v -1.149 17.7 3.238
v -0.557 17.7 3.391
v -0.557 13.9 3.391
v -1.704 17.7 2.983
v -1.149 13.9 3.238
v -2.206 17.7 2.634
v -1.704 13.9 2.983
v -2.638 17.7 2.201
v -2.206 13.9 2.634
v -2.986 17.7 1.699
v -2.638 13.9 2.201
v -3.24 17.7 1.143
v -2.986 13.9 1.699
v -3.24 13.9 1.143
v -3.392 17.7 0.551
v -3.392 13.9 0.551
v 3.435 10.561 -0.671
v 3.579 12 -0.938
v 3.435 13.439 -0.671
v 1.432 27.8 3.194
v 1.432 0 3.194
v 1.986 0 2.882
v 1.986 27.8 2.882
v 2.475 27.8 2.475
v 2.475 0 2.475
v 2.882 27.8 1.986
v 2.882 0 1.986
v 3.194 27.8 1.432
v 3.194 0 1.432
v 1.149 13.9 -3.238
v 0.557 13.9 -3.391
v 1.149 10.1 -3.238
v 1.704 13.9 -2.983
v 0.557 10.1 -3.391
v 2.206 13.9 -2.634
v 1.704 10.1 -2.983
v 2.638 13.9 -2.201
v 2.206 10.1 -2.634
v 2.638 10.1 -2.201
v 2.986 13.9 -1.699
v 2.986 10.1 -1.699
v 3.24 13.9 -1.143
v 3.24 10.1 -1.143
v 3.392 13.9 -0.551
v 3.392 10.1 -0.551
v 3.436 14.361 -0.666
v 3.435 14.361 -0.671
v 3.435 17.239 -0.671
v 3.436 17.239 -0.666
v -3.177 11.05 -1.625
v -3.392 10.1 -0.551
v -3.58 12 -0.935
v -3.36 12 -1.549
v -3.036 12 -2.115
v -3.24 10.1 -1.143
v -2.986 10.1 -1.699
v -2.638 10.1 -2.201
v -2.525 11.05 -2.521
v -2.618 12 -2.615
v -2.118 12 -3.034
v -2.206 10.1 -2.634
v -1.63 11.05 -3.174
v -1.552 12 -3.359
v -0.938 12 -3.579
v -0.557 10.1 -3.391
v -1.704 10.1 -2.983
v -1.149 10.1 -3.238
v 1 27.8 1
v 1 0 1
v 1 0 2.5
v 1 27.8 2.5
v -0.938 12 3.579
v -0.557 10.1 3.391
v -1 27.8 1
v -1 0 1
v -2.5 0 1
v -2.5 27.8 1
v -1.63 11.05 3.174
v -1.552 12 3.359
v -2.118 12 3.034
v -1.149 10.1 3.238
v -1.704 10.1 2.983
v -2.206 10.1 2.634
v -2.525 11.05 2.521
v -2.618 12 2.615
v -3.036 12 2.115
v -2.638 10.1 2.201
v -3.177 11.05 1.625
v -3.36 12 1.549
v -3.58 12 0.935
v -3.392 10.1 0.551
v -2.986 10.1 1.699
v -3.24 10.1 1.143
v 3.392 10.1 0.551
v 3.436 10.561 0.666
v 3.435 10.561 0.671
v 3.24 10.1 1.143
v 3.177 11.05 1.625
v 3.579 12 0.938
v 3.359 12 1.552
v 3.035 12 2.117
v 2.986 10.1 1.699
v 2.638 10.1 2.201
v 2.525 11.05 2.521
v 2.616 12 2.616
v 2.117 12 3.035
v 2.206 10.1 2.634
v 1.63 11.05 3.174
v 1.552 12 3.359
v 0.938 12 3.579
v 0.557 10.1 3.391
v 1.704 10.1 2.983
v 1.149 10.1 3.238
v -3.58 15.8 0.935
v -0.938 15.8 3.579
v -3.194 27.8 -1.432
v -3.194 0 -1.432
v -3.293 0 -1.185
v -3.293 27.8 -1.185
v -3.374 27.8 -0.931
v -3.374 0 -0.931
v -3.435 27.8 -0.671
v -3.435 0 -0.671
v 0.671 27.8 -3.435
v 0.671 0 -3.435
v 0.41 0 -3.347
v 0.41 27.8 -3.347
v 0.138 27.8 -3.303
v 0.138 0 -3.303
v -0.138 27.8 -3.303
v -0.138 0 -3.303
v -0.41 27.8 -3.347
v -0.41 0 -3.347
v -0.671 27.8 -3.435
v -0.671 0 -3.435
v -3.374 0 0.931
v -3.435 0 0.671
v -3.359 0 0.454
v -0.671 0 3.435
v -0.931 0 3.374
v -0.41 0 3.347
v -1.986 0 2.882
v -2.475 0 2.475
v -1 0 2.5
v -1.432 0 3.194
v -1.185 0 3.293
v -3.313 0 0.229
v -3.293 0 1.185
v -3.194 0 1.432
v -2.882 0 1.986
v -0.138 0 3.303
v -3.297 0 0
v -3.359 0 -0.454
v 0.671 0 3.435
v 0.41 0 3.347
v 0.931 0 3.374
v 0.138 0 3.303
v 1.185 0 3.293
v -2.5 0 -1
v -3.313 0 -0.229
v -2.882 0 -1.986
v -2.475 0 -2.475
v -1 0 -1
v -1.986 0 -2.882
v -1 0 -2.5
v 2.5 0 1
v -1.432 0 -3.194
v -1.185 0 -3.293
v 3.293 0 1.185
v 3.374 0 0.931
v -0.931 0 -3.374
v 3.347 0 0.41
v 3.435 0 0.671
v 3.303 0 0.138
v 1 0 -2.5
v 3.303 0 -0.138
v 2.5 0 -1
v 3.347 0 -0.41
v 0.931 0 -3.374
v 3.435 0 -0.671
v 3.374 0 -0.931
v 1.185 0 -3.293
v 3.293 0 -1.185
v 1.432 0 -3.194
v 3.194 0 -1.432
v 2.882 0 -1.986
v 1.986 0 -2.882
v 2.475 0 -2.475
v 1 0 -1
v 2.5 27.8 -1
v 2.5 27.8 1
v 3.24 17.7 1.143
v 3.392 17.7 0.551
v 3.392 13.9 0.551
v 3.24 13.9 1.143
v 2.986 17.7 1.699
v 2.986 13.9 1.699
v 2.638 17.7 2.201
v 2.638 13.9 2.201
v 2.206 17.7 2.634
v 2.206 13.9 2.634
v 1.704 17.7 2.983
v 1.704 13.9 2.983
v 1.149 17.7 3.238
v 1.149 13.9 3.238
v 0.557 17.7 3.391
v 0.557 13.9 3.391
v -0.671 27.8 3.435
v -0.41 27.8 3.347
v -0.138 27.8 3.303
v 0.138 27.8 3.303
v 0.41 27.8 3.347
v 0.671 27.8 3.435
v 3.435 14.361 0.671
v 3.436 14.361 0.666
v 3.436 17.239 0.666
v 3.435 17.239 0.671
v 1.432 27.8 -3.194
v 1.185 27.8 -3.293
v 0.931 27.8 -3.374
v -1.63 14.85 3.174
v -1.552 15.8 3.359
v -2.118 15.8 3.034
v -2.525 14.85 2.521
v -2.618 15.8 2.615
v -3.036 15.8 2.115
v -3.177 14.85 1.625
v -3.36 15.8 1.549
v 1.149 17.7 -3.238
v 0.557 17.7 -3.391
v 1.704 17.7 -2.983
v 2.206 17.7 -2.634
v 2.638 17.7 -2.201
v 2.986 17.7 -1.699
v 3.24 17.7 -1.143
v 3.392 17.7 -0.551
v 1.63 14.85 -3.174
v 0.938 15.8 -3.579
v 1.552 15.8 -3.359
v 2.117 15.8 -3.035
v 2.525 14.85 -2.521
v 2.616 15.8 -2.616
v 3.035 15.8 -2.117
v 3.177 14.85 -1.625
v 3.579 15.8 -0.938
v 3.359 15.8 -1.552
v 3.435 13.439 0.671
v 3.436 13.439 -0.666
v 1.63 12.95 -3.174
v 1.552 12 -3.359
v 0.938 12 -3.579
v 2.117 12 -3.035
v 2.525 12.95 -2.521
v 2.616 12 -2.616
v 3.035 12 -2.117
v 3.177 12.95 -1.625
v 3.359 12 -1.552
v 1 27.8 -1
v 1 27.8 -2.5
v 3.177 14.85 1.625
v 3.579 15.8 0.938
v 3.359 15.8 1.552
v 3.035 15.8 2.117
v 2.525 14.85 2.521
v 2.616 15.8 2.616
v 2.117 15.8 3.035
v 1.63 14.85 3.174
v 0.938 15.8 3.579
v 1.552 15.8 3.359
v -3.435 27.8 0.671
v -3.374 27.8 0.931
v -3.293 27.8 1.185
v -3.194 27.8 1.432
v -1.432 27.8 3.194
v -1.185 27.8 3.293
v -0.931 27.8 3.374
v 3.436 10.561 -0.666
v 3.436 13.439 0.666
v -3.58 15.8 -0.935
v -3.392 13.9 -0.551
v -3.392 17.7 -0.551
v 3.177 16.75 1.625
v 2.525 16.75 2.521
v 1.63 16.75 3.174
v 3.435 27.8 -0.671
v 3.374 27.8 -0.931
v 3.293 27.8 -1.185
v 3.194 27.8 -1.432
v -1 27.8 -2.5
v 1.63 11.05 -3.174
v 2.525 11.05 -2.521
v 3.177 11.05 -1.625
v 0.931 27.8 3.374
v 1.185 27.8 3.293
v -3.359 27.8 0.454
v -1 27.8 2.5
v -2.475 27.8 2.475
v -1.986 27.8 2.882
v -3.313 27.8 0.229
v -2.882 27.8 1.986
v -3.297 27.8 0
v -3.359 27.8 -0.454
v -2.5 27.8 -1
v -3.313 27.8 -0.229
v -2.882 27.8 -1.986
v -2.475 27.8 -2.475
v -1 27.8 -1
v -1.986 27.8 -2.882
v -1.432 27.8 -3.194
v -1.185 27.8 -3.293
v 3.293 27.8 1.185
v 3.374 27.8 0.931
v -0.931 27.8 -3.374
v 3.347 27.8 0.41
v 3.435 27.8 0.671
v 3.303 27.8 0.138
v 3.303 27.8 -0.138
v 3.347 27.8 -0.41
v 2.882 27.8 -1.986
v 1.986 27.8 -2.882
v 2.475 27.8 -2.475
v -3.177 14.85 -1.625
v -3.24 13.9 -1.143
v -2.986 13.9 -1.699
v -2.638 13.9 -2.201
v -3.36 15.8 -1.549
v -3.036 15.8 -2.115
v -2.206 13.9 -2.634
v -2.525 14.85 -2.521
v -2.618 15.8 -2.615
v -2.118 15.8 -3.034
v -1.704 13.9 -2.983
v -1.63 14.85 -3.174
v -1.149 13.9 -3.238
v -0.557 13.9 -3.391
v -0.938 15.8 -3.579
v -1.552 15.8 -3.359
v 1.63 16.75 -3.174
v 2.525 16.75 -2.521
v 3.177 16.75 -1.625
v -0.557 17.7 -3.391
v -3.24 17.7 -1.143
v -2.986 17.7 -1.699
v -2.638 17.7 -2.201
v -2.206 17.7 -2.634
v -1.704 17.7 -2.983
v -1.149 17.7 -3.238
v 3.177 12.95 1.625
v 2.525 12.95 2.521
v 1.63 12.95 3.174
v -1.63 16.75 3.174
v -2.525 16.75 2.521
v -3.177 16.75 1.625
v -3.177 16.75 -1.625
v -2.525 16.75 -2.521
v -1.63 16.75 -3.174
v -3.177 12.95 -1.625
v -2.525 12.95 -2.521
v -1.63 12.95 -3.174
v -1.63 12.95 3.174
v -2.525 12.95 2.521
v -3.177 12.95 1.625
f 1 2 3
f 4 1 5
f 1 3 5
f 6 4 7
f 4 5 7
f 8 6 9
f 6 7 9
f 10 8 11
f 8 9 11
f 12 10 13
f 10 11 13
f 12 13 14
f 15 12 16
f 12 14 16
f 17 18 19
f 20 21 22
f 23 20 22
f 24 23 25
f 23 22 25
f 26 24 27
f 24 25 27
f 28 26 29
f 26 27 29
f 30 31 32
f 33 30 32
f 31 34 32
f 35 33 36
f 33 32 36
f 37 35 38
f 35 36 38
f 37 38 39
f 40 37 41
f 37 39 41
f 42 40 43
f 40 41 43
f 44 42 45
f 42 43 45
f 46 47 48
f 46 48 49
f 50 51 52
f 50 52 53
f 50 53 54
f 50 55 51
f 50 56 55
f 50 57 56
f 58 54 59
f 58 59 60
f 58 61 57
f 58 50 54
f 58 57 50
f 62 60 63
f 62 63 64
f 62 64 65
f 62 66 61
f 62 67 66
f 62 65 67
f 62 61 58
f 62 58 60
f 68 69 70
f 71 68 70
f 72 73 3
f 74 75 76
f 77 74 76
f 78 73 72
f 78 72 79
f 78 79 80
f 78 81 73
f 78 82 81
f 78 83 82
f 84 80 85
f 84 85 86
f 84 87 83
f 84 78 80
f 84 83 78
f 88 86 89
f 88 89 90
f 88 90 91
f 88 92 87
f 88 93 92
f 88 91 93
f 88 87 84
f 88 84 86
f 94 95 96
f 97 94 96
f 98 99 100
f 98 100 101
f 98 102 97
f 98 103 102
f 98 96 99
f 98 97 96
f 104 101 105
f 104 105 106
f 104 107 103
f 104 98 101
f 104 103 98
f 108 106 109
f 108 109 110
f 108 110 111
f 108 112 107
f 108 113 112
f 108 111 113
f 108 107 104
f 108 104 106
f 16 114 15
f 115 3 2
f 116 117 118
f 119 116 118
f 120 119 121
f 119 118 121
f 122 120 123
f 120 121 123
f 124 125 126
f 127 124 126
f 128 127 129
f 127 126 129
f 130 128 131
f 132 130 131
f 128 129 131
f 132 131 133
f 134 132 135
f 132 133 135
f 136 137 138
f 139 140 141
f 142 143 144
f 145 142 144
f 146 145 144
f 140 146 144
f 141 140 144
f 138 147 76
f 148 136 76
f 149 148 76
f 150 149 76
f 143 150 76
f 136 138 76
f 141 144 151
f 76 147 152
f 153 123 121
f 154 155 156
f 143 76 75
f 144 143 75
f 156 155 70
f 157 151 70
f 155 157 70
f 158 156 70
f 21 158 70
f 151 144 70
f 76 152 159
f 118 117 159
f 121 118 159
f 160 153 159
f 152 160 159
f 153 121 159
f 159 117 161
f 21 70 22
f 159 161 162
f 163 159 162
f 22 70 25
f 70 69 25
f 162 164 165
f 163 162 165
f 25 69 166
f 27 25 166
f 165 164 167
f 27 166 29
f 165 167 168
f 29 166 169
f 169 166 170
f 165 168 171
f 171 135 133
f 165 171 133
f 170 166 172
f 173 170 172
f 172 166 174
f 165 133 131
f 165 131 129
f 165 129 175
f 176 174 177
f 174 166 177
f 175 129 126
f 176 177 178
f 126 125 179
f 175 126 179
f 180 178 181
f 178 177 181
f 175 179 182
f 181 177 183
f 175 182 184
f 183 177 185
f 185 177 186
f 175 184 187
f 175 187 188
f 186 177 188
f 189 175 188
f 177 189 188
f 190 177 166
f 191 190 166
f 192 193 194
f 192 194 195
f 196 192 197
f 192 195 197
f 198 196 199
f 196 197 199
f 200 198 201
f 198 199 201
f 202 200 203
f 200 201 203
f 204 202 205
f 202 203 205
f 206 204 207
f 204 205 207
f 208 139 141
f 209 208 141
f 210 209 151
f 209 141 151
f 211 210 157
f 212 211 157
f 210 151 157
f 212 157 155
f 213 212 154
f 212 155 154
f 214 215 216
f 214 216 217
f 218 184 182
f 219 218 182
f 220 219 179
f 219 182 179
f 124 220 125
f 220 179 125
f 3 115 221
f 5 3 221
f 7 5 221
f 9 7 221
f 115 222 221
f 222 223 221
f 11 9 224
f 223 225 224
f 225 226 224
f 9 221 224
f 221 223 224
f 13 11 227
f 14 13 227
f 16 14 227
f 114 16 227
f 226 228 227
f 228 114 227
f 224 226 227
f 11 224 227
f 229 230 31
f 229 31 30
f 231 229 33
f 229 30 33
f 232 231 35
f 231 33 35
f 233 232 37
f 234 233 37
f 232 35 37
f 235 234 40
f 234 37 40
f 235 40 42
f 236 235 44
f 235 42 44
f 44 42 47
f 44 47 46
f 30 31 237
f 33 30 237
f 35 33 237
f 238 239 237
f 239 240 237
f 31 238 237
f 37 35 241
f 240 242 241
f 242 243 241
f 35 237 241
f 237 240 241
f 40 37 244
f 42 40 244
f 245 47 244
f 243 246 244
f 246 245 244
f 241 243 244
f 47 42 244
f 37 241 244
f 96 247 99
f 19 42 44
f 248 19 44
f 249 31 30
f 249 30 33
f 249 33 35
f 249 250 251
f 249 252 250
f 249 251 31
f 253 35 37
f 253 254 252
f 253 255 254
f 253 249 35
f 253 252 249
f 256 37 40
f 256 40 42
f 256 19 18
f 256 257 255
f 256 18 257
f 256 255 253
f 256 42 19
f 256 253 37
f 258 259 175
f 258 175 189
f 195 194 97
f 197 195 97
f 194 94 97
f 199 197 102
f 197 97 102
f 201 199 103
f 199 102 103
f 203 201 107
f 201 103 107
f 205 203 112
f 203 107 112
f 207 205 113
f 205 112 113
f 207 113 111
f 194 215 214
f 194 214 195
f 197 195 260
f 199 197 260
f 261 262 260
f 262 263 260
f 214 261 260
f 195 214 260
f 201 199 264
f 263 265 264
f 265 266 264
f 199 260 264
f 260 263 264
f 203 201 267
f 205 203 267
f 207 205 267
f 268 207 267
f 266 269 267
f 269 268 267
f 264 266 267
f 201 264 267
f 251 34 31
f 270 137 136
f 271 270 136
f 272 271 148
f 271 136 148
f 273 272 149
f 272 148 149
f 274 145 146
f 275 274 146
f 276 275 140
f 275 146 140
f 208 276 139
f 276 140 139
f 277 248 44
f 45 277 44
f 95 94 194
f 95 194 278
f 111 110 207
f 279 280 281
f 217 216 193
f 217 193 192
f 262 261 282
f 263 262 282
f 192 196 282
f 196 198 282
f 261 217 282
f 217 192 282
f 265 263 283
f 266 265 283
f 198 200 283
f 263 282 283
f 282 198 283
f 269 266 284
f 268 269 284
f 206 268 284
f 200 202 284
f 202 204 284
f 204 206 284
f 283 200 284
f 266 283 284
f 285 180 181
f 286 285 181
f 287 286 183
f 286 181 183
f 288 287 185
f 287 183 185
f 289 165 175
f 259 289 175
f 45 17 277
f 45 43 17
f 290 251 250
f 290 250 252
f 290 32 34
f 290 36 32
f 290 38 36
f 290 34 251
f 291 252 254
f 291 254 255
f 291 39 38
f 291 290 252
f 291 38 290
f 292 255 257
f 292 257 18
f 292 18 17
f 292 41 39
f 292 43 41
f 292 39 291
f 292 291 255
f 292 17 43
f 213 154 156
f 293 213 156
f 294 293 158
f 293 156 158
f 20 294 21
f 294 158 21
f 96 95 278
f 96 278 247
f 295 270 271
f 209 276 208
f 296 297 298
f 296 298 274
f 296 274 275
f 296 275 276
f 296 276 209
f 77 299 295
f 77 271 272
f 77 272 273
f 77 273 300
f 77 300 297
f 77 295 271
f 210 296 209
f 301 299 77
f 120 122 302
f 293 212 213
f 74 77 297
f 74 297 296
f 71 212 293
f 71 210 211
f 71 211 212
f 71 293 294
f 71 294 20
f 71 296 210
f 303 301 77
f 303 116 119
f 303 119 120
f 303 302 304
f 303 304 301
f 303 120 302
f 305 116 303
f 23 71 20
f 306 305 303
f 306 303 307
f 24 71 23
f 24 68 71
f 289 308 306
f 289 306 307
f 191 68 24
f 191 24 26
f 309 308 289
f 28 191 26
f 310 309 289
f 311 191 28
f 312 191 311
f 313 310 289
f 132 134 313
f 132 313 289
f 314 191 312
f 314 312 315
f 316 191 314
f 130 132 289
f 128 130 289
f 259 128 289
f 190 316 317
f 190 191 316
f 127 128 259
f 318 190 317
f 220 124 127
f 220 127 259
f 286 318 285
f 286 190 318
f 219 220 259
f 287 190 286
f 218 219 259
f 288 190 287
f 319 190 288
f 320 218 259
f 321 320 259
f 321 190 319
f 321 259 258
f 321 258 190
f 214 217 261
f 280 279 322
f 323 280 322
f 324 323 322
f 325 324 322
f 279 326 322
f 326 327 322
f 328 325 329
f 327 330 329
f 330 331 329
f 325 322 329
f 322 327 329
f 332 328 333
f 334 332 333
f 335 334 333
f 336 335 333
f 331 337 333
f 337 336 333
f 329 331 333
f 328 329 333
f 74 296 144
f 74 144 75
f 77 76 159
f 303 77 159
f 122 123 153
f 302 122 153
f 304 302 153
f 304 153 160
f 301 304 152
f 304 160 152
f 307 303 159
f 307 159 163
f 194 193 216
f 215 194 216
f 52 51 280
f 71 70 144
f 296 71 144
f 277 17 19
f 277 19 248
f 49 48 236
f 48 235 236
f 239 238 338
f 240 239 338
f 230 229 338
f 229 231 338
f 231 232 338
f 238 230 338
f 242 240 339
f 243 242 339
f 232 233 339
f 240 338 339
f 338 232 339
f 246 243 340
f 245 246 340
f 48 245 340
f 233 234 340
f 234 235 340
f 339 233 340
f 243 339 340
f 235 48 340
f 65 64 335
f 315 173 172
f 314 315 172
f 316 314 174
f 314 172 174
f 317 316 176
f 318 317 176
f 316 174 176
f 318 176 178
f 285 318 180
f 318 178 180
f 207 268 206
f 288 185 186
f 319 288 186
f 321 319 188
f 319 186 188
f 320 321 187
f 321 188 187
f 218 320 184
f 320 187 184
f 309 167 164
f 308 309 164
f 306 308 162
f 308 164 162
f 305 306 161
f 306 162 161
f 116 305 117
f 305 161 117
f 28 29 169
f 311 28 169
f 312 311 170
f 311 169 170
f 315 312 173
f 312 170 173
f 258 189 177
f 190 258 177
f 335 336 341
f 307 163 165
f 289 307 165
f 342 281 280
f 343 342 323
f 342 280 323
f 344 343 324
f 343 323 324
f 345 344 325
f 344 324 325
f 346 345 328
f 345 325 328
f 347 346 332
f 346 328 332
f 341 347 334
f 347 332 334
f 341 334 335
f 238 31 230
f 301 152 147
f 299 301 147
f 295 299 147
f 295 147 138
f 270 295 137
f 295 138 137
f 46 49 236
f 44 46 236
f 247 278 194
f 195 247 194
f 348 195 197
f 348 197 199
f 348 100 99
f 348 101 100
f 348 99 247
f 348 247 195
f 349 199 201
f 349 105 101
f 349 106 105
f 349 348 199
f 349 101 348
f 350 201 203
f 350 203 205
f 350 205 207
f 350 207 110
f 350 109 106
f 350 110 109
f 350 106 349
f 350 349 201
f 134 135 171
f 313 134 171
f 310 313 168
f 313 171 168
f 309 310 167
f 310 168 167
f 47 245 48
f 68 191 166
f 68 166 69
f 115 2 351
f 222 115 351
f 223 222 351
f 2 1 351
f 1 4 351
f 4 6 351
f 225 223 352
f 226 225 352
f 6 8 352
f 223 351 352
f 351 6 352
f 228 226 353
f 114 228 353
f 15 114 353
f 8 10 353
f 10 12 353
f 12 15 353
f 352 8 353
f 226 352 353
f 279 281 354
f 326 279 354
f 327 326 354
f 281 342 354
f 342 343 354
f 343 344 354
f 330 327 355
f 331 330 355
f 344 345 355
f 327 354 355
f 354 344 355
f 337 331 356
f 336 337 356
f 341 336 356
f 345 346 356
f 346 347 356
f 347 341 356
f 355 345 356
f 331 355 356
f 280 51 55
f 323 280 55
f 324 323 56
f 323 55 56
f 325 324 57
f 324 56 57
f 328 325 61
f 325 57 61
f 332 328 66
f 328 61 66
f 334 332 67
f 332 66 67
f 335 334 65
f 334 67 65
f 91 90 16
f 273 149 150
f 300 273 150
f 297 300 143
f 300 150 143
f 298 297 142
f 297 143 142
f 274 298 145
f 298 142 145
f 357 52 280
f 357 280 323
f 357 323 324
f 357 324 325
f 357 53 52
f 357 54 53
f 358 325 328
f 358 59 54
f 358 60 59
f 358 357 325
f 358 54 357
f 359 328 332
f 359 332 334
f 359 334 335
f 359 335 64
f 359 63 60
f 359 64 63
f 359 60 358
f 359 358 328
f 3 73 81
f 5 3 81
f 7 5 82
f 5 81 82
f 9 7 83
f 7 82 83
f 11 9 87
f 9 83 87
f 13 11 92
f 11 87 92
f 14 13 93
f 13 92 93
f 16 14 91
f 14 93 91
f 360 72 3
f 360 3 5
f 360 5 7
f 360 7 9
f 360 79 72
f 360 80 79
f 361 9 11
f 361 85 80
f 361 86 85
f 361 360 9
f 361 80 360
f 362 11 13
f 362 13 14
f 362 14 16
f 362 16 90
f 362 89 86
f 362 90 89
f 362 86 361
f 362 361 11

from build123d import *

# Parameters (mm, degrees)
BOSS_EXTRUDE1_DEPTH = 27.8
CUT_EXTRUDE1_START  = 10.0999999
CUT_EXTRUDE1_DEPTH  = 7.6000002


# Read off the part's stored shape, not the designer's step: Cut-Extrude1
with BuildPart() as part:
    # Sketch1 → Boss-Extrude1 (new body)
    with BuildSketch(Plane(origin=(0, 0, 0), x_dir=(1, 0, 0), z_dir=(0, 1, 0))):
        with BuildLine():
            ThreePointArc((3.19363752, 1.43201934), (2.474873734, 2.474873734), (1.43201934, 3.19363752))
            ThreePointArc((1.43201934, 3.19363752), (1.058555912, 3.336084438), (0.671286664, 3.43502172))
            ThreePointArc((0.671286664, 3.43502172), (0, 3.297125136), (-0.671286664, 3.43502172))
            ThreePointArc((-0.671286664, 3.43502172), (-1.058555912, 3.336084438), (-1.43201934, 3.19363752))
            ThreePointArc((-1.43201934, 3.19363752), (-2.474873734, 2.474873734), (-3.19363752, 1.43201934))
            ThreePointArc((-3.19363752, 1.43201934), (-3.336084438, 1.058555912), (-3.43502172, 0.671286664))
            ThreePointArc((-3.43502172, 0.671286664), (-3.331955489, 0.342651883), (-3.297125136, 0))
            ThreePointArc((-3.297125136, 0), (-3.331955489, -0.342651883), (-3.43502172, -0.671286664))
            ThreePointArc((-3.43502172, -0.671286664), (-3.336084438, -1.058555912), (-3.19363752, -1.43201934))
            ThreePointArc((-3.19363752, -1.43201934), (-2.474873734, -2.474873734), (-1.43201934, -3.19363752))
            ThreePointArc((-1.43201934, -3.19363752), (-1.058555912, -3.336084438), (-0.671286664, -3.43502172))
            ThreePointArc((-0.671286664, -3.43502172), (0, -3.297125136), (0.671286664, -3.43502172))
            ThreePointArc((0.671286664, -3.43502172), (1.058555912, -3.336084438), (1.43201934, -3.19363752))
            ThreePointArc((1.43201934, -3.19363752), (2.474873734, -2.474873734), (3.19363752, -1.43201934))
            ThreePointArc((3.19363752, -1.43201934), (3.336084438, -1.058555912), (3.43502172, -0.671286664))
            ThreePointArc((3.43502172, -0.671286664), (3.297125136, 0), (3.43502172, 0.671286664))
            ThreePointArc((3.43502172, 0.671286664), (3.336084438, 1.058555912), (3.19363752, 1.43201934))
        make_face()
        Polygon((1, -1), (1, -2.5), (-1, -2.5), (-1, -1), (-2.5, -1), (-2.5, 1), (-1, 1), (-1, 2.5), (1, 2.5), (1, 1), (2.5, 1), (2.5, -1), align=None, mode=Mode.SUBTRACT)
    extrude(amount=BOSS_EXTRUDE1_DEPTH)


with BuildPart() as body_2:
    # Sketch2 → Revolve4 (revolve)
    with BuildSketch(Plane.XY, mode=Mode.PRIVATE) as revolve4_sk:
        Polygon((3.7, 15.8), (3.436, 17.7), (3.436, 15.8), (3.436, 13.9), align=None)
        Polygon((3.436, 10.1), (3.436, 12), (3.436, 13.9), (3.7, 12), align=None)
    revolve(revolve4_sk.sketch.rotate(Axis((0, 32.061175454, 0), (0, -1, 0)), 90), axis=Axis((0, 32.061175454, 0), (0, -1, 0)))

    # Cut-Extrude1 outline → Cut-Extrude1 (cut)
    with BuildSketch(Plane(origin=(0, 0, 0), x_dir=(1, 0, 0), z_dir=(0, 1, 0)).offset(CUT_EXTRUDE1_START)):
        with BuildLine():
            ThreePointArc((0.556520579, 3.390631289), (0, 6.702874864), (-0.556520579, 3.390631289))
            ThreePointArc((-0.556520579, 3.390631289), (0, 3.436), (0.556520579, 3.390631289))
        make_face()
        with BuildLine():
            ThreePointArc((3.435021543, -0.67128625), (6.702874864, 0), (3.435021543, 0.67128625))
            ThreePointArc((3.435021543, 0.67128625), (3.435511814, 0.668773933), (3.436, 0.66626121))
            ThreePointArc((3.436, 0.66626121), (3.412749609, 0.608798977), (3.391609595, 0.550527297))
            ThreePointArc((3.391609595, 0.550527297), (3.436, 0), (3.391609602, -0.550527298))
            ThreePointArc((3.391609602, -0.550527298), (3.412749609, -0.608798977), (3.436, -0.66626121))
            ThreePointArc((3.436, -0.66626121), (3.435511814, -0.668773933), (3.435021543, -0.67128625))
        make_face()
        with BuildLine():
            ThreePointArc((-3.391609614, -0.550527225), (-3.436, 0), (-3.391609614, 0.550527225))
            ThreePointArc((-3.391609614, 0.550527225), (-6.7, 0), (-3.391609614, -0.550527225))
        make_face()
        with BuildLine():
            ThreePointArc((0.556520586, -3.390631333), (0, -3.436), (-0.556520586, -3.390631333))
            ThreePointArc((-0.556520586, -3.390631333), (0, -6.702874864), (0.556520586, -3.390631333))
        make_face()
    extrude(amount=CUT_EXTRUDE1_DEPTH, mode=Mode.SUBTRACT)


solid = Compound([part.part, body_2.part])
